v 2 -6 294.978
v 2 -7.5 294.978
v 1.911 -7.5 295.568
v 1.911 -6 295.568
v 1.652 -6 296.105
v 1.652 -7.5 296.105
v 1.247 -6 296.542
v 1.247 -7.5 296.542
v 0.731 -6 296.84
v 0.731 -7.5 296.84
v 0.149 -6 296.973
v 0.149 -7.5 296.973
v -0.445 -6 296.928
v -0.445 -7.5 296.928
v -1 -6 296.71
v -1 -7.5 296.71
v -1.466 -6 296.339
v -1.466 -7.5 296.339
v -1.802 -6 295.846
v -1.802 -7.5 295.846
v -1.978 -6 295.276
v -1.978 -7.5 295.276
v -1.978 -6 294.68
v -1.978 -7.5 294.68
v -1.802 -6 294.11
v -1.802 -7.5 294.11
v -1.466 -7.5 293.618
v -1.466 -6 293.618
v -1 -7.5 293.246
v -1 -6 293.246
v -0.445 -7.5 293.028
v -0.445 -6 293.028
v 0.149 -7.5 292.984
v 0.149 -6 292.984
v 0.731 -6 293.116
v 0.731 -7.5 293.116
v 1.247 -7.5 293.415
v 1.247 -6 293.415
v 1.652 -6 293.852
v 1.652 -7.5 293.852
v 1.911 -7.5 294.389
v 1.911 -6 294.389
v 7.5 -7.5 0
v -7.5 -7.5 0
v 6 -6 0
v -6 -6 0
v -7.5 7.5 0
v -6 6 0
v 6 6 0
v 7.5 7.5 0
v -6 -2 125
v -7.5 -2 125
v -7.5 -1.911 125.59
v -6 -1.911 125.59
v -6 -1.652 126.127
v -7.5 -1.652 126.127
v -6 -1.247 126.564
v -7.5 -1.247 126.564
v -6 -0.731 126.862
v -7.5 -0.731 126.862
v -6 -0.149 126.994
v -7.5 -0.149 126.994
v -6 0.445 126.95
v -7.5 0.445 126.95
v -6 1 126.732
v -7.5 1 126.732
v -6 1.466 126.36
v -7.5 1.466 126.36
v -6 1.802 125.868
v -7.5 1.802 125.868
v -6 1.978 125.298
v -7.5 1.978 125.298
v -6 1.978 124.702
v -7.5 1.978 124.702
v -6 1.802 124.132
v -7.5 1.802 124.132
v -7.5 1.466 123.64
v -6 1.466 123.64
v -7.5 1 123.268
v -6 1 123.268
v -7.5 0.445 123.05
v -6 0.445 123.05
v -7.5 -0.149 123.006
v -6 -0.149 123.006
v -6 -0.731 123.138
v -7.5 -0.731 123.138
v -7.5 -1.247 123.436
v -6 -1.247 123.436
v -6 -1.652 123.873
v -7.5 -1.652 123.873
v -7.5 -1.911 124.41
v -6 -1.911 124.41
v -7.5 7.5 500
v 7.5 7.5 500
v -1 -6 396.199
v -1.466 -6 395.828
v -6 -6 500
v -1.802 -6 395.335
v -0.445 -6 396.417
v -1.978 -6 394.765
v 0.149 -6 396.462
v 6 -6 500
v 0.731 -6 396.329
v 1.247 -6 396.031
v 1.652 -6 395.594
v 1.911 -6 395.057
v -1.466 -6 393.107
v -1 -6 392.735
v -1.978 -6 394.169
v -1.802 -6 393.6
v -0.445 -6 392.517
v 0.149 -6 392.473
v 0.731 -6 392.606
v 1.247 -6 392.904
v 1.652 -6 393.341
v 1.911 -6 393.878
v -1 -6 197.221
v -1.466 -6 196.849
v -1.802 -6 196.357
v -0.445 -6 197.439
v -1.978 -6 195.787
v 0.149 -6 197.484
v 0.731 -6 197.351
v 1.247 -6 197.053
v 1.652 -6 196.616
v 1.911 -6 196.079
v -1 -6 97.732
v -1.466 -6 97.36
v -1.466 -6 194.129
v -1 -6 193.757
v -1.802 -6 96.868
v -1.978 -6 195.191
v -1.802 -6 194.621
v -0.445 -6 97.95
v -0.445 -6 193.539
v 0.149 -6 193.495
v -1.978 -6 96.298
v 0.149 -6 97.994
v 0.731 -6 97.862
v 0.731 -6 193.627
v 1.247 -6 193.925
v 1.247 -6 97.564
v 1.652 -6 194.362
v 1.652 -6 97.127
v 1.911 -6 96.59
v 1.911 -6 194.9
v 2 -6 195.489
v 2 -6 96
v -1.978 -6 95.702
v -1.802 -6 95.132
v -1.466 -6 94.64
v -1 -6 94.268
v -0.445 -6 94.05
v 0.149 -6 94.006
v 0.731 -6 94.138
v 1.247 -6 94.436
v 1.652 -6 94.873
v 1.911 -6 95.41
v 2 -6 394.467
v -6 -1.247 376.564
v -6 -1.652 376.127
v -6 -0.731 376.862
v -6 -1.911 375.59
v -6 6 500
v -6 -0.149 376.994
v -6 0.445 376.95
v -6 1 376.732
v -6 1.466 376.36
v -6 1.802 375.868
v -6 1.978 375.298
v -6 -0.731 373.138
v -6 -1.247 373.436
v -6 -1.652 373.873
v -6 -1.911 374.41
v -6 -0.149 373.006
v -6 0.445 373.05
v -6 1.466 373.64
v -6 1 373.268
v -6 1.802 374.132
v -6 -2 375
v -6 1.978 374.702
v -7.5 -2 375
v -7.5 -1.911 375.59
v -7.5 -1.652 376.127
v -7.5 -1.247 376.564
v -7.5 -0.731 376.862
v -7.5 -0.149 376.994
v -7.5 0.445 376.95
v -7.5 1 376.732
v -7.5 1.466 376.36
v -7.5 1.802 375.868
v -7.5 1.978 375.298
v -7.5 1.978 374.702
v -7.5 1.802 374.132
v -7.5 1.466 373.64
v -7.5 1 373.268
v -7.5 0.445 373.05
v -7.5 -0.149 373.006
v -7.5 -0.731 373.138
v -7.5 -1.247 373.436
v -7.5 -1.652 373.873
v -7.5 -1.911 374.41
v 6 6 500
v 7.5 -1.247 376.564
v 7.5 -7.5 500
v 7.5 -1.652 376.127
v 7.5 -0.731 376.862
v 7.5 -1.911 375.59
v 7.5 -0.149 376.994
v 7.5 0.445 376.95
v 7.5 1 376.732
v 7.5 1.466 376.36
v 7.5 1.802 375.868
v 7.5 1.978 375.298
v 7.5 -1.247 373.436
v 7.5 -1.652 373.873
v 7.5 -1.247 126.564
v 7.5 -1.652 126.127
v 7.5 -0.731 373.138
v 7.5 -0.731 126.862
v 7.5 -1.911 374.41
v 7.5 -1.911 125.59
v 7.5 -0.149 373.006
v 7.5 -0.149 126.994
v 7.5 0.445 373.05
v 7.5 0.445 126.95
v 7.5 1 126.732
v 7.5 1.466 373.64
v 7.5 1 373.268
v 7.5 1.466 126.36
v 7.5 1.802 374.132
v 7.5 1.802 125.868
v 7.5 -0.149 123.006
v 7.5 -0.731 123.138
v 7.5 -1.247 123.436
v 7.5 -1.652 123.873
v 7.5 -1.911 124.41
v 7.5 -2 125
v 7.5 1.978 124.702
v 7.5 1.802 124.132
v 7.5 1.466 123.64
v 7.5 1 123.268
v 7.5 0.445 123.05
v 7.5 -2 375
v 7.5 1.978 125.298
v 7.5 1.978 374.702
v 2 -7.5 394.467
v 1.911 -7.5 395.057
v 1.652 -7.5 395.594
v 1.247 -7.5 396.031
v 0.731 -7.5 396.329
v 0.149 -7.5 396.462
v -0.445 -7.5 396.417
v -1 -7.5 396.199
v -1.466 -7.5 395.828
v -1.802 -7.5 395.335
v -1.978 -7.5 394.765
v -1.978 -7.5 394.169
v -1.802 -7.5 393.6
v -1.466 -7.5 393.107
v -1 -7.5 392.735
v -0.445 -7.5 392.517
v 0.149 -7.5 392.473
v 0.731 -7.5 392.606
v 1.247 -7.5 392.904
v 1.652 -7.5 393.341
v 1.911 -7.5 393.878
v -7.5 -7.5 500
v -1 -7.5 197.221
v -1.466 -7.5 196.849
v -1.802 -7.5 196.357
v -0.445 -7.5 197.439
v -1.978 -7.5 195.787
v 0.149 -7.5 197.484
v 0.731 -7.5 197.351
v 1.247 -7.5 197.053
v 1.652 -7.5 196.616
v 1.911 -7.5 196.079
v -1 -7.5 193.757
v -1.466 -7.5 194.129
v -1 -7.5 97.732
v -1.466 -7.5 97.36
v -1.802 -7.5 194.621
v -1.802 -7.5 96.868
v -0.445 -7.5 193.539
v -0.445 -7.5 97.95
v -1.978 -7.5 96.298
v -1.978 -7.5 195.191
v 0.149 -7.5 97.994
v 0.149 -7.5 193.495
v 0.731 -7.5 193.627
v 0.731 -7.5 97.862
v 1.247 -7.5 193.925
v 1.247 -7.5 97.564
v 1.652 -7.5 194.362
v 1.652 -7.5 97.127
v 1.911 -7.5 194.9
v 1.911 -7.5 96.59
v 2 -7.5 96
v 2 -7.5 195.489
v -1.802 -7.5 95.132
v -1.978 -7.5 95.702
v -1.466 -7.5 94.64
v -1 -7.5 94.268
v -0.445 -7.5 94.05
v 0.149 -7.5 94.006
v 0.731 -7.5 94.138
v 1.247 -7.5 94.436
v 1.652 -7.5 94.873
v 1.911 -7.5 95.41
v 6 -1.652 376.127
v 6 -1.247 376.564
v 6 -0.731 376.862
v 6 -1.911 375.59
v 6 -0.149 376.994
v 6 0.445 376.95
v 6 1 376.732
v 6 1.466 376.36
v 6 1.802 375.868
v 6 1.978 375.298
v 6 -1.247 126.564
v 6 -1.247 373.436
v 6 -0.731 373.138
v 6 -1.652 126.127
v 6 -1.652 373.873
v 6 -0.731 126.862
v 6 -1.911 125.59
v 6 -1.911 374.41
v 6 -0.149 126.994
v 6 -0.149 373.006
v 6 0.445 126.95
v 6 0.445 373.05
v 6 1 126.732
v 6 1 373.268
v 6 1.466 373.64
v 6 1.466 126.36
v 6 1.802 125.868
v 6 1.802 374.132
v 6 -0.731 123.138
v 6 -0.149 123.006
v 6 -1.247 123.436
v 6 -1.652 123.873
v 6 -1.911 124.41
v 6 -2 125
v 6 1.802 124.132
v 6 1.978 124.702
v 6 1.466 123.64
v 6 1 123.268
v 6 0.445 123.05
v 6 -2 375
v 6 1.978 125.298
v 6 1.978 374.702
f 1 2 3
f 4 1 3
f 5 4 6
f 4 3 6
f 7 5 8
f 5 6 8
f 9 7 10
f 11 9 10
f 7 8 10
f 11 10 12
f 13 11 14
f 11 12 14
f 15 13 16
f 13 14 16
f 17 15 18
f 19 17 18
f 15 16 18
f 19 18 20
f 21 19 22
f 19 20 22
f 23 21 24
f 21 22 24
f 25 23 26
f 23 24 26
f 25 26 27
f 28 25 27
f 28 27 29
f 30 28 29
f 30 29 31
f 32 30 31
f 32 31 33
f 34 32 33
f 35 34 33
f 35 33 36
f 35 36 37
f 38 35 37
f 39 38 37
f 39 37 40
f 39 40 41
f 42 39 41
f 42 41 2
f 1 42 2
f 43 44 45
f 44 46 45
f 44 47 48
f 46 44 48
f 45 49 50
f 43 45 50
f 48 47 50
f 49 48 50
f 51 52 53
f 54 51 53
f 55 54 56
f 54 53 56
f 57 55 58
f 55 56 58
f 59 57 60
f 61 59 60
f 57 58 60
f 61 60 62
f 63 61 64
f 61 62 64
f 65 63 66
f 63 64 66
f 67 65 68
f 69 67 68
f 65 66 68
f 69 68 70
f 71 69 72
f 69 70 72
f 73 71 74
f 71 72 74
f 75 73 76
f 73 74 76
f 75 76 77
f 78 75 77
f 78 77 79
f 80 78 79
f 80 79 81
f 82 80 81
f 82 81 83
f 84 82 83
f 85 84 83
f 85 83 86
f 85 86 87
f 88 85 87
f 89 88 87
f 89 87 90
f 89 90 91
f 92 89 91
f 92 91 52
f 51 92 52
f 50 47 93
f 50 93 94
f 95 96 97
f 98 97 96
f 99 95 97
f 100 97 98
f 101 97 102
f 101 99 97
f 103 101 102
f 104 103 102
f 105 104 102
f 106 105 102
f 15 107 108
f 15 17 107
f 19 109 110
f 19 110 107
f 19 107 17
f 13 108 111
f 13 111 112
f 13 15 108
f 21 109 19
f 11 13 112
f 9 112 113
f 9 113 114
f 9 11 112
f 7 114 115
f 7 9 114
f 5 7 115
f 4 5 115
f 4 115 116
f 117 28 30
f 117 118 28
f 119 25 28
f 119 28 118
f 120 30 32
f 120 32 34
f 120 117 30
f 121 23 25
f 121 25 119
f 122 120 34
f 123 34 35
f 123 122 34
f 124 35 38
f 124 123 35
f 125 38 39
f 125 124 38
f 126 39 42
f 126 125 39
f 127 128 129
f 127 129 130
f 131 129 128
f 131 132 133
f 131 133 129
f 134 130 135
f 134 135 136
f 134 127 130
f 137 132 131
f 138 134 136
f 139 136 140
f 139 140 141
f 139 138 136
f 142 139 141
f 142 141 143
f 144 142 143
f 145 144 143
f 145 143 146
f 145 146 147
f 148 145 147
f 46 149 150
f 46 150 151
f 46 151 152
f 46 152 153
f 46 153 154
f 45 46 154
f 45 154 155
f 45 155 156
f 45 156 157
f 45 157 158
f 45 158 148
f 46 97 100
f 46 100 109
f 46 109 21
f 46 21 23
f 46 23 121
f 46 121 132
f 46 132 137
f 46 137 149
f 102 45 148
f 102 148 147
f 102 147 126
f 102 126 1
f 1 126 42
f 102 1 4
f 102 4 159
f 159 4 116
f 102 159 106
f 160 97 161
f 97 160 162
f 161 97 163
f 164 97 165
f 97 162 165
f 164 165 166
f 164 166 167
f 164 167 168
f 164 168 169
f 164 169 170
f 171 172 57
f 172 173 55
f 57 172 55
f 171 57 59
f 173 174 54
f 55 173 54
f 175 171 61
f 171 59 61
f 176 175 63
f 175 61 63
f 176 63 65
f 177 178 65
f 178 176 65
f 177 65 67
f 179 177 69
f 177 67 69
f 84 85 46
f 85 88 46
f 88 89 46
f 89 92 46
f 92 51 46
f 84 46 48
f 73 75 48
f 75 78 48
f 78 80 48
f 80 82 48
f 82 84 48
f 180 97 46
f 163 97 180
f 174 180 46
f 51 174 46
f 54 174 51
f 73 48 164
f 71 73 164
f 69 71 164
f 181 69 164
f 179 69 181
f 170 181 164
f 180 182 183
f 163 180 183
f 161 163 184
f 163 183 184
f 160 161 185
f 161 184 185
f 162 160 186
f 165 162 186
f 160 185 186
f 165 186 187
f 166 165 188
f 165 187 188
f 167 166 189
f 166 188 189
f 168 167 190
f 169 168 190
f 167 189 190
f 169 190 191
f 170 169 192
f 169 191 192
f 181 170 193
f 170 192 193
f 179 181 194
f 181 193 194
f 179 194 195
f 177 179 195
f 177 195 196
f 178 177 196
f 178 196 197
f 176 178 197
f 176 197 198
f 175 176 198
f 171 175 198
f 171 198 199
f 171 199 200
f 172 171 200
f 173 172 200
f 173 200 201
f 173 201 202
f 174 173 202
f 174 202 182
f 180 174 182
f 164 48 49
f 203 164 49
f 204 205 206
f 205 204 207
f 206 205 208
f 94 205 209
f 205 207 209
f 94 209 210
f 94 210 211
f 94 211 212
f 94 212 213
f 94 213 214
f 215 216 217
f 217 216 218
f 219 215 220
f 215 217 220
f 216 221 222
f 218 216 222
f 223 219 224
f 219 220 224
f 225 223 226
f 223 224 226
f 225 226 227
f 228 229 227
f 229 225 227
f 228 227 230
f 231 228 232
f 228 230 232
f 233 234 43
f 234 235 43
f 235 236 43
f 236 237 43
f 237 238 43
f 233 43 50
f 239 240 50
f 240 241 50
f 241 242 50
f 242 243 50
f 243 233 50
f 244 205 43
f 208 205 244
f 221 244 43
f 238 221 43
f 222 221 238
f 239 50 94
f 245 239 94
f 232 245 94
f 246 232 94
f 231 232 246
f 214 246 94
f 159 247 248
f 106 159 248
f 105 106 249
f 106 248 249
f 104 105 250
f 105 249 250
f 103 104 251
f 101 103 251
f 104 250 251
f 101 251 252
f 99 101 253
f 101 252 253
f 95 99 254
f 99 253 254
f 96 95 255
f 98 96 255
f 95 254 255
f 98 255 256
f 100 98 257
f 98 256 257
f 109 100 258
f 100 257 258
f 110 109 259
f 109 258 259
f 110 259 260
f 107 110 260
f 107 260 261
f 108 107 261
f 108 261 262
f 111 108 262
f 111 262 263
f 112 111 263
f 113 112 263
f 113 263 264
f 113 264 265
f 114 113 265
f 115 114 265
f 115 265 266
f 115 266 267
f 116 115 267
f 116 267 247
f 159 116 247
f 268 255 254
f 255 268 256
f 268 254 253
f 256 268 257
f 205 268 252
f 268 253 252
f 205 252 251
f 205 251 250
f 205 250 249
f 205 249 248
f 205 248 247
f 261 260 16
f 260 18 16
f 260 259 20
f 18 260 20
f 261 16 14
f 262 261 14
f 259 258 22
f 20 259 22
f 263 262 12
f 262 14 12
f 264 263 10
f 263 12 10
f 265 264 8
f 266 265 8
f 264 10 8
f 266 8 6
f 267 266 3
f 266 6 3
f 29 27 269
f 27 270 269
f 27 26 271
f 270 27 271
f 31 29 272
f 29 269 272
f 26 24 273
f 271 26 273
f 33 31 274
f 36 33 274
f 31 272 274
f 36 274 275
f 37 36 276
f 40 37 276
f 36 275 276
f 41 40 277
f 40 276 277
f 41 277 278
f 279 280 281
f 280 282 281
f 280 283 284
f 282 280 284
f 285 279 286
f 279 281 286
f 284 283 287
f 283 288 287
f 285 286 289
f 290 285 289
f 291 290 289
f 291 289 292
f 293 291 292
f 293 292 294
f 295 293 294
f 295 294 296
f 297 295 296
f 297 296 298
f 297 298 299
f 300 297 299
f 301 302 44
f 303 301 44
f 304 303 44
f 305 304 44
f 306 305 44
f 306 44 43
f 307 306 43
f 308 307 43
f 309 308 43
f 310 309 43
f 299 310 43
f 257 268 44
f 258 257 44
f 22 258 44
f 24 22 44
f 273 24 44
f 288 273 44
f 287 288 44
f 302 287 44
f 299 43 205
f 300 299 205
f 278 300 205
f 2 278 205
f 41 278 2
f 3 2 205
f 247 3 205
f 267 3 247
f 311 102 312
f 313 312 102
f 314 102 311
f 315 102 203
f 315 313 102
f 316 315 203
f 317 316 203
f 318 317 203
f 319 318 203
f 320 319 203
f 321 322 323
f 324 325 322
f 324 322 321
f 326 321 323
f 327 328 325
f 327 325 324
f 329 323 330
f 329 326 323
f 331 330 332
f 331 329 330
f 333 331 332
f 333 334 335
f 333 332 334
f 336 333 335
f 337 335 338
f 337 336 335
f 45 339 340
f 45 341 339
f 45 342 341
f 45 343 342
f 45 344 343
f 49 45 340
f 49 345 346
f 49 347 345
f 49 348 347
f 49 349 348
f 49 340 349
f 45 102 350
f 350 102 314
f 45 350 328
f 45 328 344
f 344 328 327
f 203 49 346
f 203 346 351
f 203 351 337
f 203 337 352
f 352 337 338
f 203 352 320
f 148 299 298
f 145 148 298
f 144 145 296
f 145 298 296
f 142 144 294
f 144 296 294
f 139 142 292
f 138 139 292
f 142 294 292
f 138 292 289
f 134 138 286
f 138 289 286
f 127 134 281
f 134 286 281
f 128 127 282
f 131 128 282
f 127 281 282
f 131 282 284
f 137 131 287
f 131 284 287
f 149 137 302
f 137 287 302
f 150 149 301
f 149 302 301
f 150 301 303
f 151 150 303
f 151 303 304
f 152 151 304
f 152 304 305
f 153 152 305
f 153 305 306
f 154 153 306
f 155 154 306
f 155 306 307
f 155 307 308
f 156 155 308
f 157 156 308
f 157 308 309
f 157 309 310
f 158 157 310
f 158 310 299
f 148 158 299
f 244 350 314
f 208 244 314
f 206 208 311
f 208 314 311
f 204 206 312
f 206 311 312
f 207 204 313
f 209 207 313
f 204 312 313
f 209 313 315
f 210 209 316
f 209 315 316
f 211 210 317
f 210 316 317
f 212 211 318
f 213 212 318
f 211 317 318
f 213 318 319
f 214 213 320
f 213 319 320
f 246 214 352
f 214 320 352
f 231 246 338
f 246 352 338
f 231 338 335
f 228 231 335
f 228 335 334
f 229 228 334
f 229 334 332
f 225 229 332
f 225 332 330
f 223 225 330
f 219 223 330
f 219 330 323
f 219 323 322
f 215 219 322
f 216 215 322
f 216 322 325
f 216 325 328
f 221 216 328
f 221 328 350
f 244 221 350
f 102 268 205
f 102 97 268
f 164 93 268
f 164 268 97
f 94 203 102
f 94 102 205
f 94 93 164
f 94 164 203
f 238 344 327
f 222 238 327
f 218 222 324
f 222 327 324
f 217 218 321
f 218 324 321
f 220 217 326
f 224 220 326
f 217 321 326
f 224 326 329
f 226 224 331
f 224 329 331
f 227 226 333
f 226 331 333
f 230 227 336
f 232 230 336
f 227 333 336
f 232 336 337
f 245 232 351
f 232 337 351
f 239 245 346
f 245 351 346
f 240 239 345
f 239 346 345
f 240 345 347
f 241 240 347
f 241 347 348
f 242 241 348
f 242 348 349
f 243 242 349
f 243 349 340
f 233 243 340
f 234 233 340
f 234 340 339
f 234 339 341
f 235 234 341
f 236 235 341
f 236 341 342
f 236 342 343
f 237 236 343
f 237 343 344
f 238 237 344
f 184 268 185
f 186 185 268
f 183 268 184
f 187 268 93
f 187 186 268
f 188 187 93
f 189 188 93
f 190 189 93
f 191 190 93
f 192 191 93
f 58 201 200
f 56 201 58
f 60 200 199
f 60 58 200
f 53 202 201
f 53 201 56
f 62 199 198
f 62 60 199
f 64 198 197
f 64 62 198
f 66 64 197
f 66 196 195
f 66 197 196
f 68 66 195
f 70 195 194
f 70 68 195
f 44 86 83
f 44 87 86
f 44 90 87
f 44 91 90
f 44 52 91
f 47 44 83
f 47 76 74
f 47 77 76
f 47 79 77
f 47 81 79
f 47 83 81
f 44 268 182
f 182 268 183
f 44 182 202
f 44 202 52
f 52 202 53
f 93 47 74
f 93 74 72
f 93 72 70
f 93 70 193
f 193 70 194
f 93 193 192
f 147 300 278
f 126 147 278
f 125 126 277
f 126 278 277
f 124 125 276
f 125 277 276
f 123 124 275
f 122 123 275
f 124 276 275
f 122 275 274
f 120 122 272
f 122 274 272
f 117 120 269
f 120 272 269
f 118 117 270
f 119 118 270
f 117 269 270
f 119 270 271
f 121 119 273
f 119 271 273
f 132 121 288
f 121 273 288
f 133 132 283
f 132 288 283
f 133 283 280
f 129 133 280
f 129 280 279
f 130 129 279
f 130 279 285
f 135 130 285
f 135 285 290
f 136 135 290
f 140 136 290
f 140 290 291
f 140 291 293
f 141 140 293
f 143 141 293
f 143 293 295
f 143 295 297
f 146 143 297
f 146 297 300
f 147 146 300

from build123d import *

# Parameters (mm, degrees)
SKETCH_W        = 15
SKETCH_H        = 15
SKETCH_W_2      = 12
SKETCH_H_2      = 12
PAD_DEPTH       = 500
SKETCH001_R     = 2
POCKET_DEPTH    = 5
SKETCH002_R     = 2
POCKET001_DEPTH = 30


with BuildPart() as part:
    # Sketch → Pad (new body)
    with BuildSketch(Plane.XY):
        Rectangle(SKETCH_W, SKETCH_H)
        Rectangle(SKETCH_W_2, SKETCH_H_2, mode=Mode.SUBTRACT)
    extrude(amount=PAD_DEPTH)

    # Sketch001 → Pocket (cut)
    with BuildSketch(Plane.XZ.offset(7.5)):
        with Locations((0, 195.4891)):
            Circle(SKETCH001_R)
        with Locations((0, 96)):
            Circle(SKETCH001_R)
        with Locations((0, 294.9782)):
            Circle(SKETCH001_R)
        with Locations((0, 394.4673)):
            Circle(SKETCH001_R)
    extrude(amount=-POCKET_DEPTH, mode=Mode.SUBTRACT)

    # Sketch002 → Pocket001 (cut)
    with BuildSketch(Plane(origin=(-7.5, 0, 0), x_dir=(0, -1, 0), z_dir=(-1, 0, 0))):
        with Locations((0, 375)):
            Circle(SKETCH002_R)
        with Locations((0, 125)):
            Circle(SKETCH002_R)
    extrude(amount=-POCKET001_DEPTH, mode=Mode.SUBTRACT)


solid = part.part
